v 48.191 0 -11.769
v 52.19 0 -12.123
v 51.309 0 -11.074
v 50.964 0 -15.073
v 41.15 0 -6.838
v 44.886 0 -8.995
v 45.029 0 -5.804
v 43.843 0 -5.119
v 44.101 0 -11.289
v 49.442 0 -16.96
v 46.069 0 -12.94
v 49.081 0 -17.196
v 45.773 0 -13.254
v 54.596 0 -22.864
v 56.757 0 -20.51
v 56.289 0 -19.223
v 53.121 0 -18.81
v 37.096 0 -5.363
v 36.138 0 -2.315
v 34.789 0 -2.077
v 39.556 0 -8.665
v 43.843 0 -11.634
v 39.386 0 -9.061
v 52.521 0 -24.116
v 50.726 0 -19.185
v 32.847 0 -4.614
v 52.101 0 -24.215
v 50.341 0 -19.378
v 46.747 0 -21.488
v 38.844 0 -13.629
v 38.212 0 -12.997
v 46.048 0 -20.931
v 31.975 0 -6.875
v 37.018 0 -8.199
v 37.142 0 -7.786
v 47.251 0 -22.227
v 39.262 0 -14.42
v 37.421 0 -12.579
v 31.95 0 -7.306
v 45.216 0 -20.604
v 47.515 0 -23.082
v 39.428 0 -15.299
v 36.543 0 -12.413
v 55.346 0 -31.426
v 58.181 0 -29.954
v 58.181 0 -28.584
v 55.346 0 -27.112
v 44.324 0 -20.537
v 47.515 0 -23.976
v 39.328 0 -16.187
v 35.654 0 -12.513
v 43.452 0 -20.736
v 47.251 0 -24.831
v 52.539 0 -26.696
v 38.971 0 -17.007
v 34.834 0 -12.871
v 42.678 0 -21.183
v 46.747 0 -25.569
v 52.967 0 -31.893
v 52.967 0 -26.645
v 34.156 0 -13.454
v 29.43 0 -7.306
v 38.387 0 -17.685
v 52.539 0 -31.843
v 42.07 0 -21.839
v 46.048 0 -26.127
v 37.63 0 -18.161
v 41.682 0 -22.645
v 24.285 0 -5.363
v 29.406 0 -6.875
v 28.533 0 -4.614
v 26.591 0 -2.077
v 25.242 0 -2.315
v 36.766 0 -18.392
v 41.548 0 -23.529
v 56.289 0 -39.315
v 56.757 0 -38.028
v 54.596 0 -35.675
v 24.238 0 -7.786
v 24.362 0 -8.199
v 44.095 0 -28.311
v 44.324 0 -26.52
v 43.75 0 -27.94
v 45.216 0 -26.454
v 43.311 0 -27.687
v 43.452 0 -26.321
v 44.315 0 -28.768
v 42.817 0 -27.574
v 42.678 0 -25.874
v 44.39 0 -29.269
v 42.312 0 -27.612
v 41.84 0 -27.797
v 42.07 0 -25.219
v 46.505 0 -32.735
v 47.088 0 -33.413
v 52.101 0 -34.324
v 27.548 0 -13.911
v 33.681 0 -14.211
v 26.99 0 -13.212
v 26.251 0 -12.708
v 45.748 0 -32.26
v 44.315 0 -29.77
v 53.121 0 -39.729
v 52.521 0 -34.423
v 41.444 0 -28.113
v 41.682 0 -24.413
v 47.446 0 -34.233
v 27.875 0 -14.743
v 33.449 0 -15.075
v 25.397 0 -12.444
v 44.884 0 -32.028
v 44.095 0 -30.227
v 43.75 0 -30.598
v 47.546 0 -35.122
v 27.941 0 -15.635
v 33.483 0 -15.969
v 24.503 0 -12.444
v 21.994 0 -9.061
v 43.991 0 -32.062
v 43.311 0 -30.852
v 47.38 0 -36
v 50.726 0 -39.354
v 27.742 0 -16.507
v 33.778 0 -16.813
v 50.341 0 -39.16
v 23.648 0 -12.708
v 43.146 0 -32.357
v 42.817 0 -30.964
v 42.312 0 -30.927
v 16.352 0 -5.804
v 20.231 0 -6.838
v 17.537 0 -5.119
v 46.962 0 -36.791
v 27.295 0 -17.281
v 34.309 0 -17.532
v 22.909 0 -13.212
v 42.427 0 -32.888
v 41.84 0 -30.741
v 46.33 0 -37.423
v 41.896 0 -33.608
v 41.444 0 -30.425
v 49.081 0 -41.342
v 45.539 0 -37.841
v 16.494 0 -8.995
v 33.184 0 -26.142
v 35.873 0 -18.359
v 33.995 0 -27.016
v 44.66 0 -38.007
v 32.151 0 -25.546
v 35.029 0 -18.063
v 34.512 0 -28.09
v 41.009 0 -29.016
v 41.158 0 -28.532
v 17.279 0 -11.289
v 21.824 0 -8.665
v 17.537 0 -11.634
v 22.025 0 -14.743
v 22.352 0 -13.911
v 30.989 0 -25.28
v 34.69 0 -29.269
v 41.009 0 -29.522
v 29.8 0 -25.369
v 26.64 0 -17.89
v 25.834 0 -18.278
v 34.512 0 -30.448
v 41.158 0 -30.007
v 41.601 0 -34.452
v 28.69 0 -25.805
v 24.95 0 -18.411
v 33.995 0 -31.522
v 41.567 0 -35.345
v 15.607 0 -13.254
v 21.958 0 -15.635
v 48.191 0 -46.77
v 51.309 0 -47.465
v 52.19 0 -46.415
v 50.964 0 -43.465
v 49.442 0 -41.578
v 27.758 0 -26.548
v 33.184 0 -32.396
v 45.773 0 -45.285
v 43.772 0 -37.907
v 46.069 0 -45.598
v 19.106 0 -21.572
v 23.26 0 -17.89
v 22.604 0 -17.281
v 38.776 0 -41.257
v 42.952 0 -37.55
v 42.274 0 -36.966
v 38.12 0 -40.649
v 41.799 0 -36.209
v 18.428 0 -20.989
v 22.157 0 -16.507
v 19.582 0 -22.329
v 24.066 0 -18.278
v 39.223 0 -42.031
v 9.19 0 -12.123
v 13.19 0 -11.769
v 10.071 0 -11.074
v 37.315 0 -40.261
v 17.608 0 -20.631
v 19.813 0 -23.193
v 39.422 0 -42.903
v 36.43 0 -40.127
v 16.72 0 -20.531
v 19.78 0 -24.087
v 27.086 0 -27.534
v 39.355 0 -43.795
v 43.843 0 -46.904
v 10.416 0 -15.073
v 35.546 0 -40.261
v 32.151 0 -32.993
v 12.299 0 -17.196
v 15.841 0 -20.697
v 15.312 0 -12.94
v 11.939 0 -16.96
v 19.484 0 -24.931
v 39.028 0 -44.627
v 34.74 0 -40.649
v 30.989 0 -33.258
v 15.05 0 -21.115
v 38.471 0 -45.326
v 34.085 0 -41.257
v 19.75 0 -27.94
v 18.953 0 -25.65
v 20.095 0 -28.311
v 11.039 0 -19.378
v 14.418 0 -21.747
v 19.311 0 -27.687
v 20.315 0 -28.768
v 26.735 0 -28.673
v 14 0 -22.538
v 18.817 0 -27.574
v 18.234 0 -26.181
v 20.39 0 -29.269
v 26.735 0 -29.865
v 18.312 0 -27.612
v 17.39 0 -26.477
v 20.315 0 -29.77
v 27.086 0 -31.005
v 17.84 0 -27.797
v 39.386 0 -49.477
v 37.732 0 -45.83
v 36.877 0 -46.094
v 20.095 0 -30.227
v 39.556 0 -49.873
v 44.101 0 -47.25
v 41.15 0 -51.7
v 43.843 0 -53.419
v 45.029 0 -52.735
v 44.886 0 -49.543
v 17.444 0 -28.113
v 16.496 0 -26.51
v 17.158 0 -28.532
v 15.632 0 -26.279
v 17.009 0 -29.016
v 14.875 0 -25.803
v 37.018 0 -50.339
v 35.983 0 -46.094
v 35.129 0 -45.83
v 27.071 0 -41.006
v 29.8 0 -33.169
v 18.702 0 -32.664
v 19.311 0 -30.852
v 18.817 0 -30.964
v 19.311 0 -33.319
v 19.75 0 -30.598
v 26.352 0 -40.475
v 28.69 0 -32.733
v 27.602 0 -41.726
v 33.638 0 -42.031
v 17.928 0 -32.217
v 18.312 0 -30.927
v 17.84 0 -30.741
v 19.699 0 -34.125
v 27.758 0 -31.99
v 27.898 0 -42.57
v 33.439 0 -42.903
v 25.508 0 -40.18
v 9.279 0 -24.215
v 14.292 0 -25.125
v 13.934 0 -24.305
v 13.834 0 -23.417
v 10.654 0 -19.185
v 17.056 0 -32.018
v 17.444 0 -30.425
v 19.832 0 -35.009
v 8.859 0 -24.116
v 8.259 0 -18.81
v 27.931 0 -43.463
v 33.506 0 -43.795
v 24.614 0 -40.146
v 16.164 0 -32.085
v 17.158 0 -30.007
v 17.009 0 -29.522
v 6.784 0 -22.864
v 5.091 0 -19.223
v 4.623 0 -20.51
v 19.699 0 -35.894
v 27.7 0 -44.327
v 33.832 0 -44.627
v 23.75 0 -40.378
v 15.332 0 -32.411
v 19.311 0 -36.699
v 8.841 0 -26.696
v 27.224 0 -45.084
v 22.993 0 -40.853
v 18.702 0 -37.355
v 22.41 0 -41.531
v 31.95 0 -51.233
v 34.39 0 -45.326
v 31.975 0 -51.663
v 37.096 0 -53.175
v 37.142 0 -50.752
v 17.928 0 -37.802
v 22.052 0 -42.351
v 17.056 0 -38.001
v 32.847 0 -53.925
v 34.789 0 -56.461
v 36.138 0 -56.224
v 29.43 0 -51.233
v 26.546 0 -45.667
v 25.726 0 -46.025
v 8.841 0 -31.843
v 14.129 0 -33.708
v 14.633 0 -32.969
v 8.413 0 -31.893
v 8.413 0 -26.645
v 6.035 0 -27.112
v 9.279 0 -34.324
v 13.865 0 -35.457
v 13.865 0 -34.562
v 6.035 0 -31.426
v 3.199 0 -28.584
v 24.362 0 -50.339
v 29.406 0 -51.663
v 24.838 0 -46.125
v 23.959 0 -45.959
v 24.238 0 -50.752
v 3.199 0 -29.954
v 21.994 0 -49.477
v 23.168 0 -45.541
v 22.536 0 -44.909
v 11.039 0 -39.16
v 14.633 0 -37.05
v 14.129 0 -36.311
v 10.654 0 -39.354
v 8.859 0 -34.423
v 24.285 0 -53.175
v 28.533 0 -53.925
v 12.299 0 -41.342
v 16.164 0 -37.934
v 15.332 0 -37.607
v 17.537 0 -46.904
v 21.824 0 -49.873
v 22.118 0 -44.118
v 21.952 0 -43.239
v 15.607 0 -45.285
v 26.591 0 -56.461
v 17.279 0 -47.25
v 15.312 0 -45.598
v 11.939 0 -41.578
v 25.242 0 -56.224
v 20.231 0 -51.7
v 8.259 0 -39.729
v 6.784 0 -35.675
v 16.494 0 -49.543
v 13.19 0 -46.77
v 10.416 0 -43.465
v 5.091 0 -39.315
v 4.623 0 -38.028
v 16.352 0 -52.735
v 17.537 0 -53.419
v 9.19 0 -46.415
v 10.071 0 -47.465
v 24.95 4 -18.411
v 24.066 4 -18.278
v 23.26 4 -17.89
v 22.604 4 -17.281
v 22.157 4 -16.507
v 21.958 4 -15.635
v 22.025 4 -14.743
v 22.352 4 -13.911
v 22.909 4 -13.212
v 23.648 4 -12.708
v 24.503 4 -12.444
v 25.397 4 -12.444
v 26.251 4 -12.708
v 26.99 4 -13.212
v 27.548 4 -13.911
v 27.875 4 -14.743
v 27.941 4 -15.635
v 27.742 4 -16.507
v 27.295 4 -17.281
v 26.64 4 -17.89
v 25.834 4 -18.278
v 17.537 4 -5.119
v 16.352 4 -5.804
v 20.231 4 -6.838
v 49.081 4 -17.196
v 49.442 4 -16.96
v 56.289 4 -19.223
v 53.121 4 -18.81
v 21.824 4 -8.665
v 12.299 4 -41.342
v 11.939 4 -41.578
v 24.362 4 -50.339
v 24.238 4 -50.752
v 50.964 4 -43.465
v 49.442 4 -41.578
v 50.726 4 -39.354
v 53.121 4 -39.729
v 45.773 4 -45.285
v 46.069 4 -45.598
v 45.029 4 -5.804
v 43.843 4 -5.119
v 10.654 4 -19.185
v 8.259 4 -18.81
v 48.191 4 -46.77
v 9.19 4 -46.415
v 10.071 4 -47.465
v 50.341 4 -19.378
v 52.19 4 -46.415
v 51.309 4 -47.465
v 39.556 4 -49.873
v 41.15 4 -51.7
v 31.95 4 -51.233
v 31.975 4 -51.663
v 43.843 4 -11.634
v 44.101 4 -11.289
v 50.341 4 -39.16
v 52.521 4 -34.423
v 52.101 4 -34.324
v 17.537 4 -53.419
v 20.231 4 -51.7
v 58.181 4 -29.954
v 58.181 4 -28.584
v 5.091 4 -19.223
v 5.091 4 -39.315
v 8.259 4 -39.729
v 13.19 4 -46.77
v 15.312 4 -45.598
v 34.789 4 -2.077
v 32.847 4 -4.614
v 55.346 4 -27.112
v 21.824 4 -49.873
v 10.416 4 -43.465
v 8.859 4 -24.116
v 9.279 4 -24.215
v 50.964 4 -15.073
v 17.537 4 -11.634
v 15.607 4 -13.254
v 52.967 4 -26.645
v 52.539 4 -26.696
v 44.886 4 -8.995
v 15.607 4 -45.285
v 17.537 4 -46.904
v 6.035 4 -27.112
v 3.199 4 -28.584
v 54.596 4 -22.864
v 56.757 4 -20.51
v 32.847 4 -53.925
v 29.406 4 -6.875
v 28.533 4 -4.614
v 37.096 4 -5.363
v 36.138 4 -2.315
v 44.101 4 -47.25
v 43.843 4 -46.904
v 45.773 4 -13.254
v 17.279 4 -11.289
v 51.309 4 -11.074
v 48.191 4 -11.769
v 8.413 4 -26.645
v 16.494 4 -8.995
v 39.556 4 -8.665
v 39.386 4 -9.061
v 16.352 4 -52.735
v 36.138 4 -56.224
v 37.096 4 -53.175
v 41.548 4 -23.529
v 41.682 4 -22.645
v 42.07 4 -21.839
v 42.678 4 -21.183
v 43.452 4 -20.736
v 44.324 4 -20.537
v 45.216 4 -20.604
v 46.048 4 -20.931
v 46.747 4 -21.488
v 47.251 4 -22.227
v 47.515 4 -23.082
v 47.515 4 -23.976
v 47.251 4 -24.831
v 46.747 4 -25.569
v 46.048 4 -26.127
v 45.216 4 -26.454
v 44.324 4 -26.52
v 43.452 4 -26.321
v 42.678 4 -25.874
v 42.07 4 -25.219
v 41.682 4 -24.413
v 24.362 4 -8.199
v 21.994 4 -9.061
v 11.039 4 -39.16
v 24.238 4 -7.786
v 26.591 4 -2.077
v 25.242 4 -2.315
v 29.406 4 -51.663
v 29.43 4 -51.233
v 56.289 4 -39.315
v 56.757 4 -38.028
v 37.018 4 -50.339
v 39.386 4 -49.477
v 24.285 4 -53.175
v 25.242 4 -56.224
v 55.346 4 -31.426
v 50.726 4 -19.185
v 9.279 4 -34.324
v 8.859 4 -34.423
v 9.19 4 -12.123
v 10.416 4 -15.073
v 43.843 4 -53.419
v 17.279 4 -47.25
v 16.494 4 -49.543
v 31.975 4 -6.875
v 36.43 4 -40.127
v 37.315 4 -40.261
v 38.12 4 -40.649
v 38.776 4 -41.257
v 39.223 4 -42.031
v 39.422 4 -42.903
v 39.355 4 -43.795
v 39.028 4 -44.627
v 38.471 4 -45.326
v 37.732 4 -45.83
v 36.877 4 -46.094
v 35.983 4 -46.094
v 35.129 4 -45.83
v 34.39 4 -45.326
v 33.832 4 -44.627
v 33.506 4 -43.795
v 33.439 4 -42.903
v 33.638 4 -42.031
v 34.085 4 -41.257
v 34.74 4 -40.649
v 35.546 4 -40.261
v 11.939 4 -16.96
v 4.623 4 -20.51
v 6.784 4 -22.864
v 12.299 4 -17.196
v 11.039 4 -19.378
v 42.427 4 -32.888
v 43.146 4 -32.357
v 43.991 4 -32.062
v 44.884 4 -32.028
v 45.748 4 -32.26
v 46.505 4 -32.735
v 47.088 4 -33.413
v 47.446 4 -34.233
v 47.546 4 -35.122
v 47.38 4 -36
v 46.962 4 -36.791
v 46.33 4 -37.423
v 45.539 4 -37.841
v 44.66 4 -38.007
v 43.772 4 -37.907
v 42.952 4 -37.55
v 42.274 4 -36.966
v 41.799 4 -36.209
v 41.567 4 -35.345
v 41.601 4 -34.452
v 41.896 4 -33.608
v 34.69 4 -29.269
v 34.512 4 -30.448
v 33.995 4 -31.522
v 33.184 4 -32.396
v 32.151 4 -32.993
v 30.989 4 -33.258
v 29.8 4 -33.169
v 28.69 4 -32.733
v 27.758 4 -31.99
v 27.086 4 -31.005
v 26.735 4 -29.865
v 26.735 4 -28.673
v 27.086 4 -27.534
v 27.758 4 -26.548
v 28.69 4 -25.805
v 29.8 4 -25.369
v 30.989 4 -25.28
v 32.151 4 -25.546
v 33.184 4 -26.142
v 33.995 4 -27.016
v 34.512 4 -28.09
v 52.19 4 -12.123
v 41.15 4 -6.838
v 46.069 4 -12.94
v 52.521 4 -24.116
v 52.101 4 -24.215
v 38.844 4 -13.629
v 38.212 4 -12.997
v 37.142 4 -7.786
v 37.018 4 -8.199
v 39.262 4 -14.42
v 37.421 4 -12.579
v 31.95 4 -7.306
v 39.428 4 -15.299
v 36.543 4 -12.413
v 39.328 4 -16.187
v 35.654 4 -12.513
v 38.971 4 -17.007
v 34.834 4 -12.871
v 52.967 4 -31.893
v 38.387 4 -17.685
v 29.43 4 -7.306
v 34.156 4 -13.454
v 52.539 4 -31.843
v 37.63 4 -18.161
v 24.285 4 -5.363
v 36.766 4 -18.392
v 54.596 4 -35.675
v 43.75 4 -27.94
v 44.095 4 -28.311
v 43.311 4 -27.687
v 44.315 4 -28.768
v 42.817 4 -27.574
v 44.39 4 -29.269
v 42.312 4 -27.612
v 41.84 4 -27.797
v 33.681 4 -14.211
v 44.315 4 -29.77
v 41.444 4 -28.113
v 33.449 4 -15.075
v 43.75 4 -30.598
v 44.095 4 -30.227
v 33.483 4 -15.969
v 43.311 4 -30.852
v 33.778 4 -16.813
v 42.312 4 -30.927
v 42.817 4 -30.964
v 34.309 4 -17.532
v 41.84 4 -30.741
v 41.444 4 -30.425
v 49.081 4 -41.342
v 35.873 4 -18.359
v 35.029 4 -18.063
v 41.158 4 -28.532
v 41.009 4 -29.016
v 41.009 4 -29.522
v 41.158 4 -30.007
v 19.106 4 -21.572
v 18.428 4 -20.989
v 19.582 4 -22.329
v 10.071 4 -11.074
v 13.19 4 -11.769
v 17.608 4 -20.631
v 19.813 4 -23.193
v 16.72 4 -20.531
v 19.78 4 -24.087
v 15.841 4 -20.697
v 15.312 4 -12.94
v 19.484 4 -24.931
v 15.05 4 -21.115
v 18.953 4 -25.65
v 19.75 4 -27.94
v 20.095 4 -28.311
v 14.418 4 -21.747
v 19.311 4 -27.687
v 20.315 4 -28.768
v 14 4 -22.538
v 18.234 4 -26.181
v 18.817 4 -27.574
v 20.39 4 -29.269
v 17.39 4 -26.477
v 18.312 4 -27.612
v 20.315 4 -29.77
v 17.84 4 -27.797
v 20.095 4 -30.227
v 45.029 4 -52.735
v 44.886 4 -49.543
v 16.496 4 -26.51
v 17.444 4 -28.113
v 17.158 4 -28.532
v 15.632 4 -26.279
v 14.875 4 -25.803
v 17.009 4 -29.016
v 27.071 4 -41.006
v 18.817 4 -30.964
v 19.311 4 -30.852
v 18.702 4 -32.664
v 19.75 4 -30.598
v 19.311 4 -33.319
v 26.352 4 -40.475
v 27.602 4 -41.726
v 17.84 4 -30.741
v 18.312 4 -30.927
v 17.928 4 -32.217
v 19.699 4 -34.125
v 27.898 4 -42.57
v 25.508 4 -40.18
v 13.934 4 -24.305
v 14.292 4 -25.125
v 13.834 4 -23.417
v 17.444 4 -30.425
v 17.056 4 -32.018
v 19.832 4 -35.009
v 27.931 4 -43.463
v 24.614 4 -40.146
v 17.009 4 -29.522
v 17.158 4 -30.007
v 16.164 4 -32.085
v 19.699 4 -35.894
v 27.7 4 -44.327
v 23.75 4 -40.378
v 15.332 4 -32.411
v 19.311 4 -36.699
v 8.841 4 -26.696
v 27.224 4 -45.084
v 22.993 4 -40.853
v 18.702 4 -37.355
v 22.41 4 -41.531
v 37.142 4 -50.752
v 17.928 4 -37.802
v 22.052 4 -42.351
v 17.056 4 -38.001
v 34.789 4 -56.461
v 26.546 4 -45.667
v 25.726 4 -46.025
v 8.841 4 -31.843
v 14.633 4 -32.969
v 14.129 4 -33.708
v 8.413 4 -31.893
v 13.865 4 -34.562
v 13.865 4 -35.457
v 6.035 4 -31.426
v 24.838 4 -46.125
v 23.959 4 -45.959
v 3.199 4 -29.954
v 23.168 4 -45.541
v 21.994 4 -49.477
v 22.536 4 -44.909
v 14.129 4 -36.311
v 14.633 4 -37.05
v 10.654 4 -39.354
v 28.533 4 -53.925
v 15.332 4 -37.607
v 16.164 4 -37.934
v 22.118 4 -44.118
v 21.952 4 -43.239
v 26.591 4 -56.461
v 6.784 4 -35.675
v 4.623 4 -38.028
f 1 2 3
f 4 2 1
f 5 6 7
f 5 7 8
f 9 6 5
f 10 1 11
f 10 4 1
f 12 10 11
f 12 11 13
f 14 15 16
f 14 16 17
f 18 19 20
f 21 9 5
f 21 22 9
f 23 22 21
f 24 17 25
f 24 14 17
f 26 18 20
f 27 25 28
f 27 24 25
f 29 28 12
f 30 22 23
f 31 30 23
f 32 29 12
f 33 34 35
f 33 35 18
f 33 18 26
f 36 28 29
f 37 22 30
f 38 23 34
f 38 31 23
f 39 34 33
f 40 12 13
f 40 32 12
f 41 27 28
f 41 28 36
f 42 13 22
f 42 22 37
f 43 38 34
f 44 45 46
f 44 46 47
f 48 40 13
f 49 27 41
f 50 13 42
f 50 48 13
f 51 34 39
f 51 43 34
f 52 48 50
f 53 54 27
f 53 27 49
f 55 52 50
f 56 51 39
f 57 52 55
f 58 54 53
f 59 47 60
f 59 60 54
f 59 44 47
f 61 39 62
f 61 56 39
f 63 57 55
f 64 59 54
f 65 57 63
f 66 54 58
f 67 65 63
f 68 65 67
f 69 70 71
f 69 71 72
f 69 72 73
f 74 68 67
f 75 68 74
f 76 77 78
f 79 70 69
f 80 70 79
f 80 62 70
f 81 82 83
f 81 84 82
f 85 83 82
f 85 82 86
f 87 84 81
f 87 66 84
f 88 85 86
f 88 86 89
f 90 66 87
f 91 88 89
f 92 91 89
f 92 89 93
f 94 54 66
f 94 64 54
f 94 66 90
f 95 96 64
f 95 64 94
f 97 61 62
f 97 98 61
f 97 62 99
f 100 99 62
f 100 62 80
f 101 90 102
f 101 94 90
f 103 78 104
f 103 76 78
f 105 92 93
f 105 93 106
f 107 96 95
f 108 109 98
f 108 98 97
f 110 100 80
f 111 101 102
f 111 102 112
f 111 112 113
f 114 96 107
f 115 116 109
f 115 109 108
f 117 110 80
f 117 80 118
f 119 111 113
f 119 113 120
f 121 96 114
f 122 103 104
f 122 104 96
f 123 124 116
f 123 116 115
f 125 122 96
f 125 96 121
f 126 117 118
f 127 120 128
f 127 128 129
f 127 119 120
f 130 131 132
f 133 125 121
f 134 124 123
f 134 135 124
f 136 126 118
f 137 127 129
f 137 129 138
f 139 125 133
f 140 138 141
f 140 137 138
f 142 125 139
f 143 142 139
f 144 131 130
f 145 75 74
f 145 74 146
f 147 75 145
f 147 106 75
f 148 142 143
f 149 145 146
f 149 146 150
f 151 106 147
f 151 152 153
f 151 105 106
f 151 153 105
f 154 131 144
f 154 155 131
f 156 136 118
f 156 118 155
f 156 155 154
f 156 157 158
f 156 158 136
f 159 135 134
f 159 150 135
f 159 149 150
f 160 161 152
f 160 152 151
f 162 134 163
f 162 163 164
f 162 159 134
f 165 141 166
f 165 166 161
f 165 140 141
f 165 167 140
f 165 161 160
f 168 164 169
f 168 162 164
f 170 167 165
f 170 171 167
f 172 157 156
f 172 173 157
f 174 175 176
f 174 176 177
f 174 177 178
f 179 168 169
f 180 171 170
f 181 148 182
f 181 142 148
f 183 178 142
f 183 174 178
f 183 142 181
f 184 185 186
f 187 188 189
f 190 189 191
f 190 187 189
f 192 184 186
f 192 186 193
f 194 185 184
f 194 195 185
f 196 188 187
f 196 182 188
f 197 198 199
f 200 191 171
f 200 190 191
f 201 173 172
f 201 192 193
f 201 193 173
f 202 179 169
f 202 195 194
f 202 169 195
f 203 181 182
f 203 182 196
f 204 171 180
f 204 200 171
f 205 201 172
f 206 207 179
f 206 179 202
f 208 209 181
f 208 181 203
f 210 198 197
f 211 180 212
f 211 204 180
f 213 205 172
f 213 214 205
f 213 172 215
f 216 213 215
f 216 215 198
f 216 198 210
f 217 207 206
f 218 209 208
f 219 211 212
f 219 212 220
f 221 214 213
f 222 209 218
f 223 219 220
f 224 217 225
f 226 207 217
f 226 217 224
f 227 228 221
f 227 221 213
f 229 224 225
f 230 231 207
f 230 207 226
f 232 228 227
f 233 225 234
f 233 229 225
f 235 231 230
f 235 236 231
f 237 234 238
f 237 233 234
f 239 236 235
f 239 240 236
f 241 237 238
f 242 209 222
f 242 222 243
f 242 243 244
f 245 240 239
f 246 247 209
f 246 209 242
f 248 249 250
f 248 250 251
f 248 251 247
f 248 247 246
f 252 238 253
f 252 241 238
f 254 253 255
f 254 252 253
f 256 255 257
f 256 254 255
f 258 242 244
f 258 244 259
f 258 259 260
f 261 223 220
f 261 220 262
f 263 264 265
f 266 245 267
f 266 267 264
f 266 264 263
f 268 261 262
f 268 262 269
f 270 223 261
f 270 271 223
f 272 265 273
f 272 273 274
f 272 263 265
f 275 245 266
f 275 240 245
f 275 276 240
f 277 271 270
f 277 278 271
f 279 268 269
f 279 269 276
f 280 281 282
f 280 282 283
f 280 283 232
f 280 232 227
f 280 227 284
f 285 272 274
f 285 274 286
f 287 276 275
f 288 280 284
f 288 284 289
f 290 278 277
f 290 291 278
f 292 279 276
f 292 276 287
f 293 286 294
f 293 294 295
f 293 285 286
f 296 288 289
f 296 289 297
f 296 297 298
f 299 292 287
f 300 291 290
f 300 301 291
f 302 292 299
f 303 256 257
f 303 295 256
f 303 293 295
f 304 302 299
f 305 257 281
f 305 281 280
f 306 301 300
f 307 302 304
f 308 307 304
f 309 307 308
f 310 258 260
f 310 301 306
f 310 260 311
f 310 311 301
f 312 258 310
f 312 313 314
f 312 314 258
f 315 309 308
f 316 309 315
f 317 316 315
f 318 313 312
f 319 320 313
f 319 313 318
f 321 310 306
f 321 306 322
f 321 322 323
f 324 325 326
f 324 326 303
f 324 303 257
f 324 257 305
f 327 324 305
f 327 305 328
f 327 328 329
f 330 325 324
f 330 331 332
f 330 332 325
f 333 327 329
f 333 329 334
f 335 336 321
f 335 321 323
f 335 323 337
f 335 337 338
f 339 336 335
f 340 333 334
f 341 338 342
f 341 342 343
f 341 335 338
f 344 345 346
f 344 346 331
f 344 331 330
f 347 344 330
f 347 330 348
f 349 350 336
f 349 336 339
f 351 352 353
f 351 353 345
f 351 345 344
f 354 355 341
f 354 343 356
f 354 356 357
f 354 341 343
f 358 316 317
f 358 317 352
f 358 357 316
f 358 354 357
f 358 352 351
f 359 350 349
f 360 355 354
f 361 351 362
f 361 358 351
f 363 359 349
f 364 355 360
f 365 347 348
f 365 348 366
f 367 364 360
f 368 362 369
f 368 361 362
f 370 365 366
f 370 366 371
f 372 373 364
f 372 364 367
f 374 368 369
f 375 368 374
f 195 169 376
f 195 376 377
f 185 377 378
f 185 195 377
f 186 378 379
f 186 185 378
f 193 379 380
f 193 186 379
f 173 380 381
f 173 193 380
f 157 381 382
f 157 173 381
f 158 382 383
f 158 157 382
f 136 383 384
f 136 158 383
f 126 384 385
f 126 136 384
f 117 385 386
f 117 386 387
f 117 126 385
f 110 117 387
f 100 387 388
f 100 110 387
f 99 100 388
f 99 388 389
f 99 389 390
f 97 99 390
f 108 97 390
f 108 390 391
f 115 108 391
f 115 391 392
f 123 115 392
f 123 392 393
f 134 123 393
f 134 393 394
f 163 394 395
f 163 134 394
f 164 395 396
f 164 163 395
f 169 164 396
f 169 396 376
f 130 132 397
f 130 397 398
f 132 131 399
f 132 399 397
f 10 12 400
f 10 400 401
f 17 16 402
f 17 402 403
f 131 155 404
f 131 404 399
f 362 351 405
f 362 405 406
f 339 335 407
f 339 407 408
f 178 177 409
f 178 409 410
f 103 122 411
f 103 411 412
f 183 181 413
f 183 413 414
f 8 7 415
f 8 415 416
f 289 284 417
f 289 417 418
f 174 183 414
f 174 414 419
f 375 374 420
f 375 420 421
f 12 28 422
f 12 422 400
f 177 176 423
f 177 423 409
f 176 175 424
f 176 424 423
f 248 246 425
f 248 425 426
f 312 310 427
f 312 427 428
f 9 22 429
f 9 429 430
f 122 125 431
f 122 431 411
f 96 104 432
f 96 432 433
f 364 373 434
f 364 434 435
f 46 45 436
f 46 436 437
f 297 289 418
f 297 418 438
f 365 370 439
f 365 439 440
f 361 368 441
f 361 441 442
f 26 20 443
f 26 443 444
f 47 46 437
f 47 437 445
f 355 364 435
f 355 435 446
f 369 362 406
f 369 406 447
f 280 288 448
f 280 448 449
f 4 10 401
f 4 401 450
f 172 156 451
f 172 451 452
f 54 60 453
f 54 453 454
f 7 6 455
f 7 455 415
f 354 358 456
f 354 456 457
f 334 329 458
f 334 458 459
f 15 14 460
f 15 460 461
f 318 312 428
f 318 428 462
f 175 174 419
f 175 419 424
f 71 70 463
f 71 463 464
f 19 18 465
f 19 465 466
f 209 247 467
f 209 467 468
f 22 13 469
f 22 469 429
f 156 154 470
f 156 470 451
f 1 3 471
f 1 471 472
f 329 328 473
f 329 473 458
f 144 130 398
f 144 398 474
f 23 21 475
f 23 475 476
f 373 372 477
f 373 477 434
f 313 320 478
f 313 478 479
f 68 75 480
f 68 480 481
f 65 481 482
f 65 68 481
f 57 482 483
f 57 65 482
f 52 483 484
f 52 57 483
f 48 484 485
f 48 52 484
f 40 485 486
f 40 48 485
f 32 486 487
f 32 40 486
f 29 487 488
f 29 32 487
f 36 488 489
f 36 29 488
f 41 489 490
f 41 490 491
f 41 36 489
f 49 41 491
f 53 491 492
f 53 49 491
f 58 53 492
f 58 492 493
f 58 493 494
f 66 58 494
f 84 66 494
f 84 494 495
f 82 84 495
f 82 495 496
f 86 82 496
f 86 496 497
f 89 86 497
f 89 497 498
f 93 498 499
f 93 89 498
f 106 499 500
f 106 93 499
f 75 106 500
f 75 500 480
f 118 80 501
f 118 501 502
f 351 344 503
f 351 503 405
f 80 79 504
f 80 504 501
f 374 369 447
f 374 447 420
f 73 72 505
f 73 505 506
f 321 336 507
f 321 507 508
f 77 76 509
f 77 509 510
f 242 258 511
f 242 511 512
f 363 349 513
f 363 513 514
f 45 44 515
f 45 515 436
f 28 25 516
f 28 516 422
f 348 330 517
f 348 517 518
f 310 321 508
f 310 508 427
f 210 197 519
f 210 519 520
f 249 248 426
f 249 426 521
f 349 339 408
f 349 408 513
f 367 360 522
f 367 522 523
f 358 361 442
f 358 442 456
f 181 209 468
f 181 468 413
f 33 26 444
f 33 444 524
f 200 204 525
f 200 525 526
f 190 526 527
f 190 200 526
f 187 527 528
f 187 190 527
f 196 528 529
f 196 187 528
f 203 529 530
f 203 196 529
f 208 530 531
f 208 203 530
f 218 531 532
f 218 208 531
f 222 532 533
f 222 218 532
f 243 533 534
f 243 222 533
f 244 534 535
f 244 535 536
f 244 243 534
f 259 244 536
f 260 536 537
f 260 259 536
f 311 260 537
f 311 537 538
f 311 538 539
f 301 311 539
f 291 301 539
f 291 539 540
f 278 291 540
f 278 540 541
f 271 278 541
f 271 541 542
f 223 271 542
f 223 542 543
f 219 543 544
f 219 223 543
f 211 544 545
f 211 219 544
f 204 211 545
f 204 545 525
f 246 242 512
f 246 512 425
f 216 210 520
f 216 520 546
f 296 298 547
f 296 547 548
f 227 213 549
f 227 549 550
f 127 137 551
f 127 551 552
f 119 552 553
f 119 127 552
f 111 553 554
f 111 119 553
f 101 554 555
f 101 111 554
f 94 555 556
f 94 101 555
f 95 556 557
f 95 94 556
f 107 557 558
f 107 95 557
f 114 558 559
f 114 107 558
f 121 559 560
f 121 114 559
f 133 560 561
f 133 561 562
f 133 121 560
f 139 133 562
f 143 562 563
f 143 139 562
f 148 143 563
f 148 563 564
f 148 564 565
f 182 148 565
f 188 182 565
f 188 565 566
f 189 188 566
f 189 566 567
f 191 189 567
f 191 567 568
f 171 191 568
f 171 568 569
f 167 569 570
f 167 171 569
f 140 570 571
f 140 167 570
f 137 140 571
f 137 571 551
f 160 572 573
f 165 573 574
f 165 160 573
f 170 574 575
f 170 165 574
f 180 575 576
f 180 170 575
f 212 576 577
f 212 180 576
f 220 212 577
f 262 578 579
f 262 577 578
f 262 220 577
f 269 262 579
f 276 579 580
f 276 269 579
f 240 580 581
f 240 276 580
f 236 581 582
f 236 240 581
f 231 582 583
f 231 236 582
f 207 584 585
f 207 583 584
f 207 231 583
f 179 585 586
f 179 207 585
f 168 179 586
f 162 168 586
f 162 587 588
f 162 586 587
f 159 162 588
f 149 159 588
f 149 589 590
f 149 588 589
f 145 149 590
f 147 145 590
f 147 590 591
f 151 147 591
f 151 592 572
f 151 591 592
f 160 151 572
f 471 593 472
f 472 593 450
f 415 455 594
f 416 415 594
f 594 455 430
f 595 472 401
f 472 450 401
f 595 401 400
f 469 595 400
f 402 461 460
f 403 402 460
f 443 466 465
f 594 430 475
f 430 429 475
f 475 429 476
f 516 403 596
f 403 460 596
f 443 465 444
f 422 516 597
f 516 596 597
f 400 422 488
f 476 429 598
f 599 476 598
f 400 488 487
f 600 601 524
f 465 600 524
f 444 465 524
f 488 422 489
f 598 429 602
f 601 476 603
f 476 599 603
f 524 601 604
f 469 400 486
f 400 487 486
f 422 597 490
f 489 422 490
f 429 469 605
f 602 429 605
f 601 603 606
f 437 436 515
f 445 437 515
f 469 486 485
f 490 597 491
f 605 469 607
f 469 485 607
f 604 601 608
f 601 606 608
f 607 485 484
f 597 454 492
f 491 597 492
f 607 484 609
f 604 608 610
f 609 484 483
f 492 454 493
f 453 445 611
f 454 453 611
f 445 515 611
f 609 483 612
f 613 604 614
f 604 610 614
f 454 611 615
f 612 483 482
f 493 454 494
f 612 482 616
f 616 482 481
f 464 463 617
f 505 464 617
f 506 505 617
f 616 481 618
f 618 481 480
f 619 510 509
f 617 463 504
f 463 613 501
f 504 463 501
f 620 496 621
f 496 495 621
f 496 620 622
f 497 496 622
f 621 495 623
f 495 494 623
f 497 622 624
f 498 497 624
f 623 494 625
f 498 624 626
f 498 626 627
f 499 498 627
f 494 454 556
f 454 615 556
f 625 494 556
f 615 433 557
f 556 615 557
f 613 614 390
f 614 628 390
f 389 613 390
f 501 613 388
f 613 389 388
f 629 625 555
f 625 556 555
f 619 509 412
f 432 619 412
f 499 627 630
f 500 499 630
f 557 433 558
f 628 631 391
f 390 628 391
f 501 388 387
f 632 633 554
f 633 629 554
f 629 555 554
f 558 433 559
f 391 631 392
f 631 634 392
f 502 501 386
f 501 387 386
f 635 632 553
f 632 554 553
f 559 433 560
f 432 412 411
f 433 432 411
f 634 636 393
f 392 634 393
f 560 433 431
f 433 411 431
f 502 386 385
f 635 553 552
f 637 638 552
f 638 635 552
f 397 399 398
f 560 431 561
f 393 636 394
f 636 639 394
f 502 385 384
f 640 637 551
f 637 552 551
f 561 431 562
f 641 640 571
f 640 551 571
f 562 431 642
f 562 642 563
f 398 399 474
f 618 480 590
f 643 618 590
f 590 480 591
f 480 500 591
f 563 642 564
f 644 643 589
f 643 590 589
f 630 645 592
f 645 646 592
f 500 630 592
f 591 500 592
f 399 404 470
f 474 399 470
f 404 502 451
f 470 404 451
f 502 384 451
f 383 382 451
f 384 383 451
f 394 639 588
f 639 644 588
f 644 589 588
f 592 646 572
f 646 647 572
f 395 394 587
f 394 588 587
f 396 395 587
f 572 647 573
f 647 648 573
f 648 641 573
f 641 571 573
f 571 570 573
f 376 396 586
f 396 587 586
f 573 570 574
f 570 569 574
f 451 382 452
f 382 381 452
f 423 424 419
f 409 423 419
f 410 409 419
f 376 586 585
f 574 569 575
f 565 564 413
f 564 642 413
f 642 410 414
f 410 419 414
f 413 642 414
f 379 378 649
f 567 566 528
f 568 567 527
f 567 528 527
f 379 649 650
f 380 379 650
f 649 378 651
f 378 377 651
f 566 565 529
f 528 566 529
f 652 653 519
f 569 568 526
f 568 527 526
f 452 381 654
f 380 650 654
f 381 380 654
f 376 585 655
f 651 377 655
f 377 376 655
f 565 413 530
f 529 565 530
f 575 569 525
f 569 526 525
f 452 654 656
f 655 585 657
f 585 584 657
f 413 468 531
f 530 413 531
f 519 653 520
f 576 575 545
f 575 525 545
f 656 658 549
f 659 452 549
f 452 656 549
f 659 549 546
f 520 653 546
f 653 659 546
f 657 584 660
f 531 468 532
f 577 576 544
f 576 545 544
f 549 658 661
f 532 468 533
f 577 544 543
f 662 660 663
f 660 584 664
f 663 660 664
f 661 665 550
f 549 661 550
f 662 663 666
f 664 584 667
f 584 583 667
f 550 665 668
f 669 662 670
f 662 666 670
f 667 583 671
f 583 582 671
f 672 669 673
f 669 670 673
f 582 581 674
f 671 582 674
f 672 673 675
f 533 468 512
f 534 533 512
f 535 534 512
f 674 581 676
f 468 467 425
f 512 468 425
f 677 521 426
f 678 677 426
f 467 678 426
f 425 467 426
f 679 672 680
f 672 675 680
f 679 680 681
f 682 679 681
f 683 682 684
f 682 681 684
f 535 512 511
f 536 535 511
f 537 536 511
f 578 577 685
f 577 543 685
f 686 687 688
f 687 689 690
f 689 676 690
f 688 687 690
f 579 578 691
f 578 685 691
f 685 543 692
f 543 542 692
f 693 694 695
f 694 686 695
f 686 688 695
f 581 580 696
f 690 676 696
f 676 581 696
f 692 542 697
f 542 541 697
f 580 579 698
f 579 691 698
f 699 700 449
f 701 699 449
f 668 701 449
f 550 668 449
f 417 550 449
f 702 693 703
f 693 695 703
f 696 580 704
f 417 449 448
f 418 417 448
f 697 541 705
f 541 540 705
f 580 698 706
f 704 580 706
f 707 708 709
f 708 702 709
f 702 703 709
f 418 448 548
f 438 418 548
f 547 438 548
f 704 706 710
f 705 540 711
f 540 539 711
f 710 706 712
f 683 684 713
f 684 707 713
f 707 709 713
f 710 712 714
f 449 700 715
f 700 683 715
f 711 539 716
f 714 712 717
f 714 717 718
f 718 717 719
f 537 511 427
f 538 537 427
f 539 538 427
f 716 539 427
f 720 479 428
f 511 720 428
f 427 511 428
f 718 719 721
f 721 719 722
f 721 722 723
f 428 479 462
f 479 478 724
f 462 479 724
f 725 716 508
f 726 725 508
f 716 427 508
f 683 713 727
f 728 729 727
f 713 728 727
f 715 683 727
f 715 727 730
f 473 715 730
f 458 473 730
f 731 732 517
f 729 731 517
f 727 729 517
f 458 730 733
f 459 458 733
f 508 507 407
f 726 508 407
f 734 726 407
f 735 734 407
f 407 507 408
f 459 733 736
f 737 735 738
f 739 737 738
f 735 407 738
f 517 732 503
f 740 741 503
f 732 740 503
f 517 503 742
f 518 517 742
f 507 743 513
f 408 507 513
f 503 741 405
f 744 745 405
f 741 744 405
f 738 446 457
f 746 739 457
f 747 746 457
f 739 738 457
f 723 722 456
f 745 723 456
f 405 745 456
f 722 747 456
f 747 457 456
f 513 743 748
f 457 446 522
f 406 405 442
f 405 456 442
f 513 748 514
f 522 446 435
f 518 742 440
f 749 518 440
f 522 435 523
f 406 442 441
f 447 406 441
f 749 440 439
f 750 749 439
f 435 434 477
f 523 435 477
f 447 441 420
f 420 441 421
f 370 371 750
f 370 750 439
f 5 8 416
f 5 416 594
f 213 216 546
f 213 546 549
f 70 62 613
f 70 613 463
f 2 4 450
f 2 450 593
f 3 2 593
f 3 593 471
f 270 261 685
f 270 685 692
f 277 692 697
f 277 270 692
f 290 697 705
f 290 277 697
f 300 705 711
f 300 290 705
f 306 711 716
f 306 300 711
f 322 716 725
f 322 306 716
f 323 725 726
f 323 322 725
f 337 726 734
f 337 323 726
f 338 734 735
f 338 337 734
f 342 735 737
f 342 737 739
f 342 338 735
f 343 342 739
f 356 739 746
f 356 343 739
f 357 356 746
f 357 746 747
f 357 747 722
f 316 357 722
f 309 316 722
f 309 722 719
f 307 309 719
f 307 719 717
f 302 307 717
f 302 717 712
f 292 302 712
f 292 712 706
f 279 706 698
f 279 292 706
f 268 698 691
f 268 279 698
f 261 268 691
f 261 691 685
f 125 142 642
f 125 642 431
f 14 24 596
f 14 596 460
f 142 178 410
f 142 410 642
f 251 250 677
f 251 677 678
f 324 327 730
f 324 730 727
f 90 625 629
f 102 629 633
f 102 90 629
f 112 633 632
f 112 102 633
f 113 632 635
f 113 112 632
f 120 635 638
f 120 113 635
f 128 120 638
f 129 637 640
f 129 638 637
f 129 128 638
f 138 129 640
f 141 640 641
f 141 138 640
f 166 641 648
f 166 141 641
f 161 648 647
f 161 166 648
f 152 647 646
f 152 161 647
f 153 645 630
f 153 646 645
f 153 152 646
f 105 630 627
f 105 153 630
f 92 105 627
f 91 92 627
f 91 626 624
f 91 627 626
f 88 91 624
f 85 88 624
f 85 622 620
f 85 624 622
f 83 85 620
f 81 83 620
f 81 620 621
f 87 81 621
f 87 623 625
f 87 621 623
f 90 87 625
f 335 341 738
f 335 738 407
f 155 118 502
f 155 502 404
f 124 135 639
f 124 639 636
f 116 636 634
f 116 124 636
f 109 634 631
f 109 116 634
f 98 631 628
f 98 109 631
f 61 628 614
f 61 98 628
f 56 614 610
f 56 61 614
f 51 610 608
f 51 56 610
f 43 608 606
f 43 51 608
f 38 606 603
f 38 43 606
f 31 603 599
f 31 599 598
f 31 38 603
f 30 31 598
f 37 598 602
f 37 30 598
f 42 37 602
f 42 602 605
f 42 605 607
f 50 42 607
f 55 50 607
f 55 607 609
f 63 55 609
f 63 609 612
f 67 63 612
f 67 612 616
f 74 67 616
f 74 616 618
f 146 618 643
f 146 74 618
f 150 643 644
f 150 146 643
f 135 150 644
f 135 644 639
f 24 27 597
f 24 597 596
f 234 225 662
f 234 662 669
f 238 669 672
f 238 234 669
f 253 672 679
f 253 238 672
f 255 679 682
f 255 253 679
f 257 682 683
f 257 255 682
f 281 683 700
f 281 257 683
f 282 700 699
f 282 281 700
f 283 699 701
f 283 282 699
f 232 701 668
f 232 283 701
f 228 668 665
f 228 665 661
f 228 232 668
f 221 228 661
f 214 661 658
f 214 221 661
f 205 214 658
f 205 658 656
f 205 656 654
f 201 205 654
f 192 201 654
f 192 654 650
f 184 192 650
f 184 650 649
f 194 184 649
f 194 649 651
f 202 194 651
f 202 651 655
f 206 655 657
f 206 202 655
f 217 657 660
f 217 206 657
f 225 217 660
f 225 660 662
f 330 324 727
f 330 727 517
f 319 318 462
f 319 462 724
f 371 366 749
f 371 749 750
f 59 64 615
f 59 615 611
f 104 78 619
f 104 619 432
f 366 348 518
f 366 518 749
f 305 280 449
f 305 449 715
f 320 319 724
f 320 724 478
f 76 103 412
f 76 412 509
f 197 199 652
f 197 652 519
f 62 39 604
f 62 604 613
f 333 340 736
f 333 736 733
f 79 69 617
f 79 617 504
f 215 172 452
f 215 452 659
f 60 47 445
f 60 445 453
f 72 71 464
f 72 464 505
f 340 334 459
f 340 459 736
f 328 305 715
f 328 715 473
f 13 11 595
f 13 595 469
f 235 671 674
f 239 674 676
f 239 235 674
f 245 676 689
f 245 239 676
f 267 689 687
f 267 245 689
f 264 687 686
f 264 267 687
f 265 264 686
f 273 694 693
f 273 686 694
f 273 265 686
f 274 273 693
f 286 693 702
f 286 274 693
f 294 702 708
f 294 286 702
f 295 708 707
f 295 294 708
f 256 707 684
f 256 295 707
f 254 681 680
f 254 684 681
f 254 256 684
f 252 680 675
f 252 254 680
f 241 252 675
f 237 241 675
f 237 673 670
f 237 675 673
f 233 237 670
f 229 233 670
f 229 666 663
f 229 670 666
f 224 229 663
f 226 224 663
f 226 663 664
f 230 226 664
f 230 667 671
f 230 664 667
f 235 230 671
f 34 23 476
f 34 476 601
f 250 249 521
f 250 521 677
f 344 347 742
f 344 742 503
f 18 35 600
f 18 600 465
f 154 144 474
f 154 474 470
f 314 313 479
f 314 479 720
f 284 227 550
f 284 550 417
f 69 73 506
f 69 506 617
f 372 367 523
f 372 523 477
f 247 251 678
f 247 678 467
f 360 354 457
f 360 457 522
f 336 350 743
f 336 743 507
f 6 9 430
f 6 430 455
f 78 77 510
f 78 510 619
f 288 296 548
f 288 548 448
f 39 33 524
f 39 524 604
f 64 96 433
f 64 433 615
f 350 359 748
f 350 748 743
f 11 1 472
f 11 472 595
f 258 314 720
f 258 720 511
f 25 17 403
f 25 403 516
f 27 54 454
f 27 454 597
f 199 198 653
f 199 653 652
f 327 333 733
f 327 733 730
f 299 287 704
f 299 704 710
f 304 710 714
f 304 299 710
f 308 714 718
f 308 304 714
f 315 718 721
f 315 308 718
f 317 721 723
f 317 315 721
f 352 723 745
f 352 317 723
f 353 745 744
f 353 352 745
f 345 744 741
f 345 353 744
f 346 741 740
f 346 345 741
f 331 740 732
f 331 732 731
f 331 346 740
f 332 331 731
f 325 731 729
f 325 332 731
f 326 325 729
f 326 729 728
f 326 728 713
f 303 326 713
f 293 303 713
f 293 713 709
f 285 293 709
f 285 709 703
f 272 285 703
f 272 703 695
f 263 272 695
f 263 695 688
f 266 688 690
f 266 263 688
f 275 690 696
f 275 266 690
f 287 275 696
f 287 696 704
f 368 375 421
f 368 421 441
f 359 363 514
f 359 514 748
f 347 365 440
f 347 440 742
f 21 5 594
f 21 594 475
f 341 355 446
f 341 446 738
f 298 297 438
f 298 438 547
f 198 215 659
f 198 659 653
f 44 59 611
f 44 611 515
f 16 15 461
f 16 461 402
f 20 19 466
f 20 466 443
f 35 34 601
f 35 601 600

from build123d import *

# Parameters (mm, degrees)
BOSS_EXTRUDE1_DEPTH = 4
CUT_EXTRUDE1_REACH  = 6
SKETCH3_R           = 4
SKETCH3_R_2         = 1.7
SKETCH4_R           = 3
CUT_EXTRUDE2_DEPTH  = 4
CIRPATTERN1_COUNT   = 8


with BuildPart() as part:
    # Sketch2 → Boss-Extrude1 (new body)
    with BuildSketch(Plane(origin=(0, 0, 0), x_dir=(1, 0, 0), z_dir=(0, 1, 0))):
        Polygon((52.538734218, 31.842538875), (52.966809318, 31.892862657), (55.345625477, 31.426126758), (58.18102676, 29.953783051), (58.18102676, 28.584463126), (55.345625477, 27.112119419), (52.966809318, 26.64538352), (52.538734218, 26.695707302), (52.101156541, 24.214732135), (52.520808121, 24.115596779), (54.59638672, 22.863553353), (56.757494627, 20.510006991), (56.289031474, 19.223191192), (53.12080355, 18.809586915), (50.72600436, 19.184530393), (50.340910107, 19.378265245), (49.081307935, 17.196423401), (49.441564779, 16.959924277), (50.963799881, 15.07332886), (52.189708735, 12.122809954), (51.309369324, 11.073573865), (48.190601939, 11.768601179), (46.068586453, 12.939866968), (45.772908404, 13.25368769), (43.842900517, 11.634261062), (44.100782542, 11.288690853), (44.885873492, 8.995402472), (45.028637129, 5.803632771), (43.842684706, 5.118756998), (41.149615437, 6.838398802), (39.556106805, 8.664951285), (39.385697153, 9.061061087), (37.018327401, 8.199295971), (37.142300931, 7.786339893), (37.095648999, 5.362815632), (36.138204566, 2.314673579), (34.789402002, 2.076878058), (32.847083699, 4.613576876), (31.97451961, 6.875115771), (31.949681435, 7.305566323), (29.430477092, 7.305566323), (29.405639683, 6.875115771), (28.533075594, 4.613576876), (26.590757291, 2.076878058), (25.241954726, 2.314673579), (24.284510294, 5.362815632), (24.237858361, 7.786339893), (24.361831127, 8.199295971), (21.994461374, 9.061061087), (21.824052488, 8.664951285), (20.230543856, 6.838398802), (17.537474587, 5.118756998), (16.351521398, 5.803632771), (16.494285035, 8.995402472), (17.279376751, 11.288690853), (17.537258011, 11.634261062), (15.607250889, 13.25368769), (15.311572074, 12.939866968), (13.189557354, 11.768601179), (10.070789203, 11.073573865), (9.190449792, 12.122809954), (10.416359412, 15.07332886), (11.938594514, 16.959924277), (12.298851357, 17.196423401), (11.039249186, 19.378265245), (10.654154168, 19.184530393), (8.259354977, 18.809586915), (5.091127819, 19.223191192), (4.622664666, 20.510006991), (6.783771808, 22.863553353), (8.859351172, 24.115596779), (9.279002752, 24.214732135), (8.84142431, 26.695707302), (8.413349975, 26.64538352), (6.034533051, 27.112119419), (3.199132533, 28.584463126), (3.199132533, 29.953783051), (6.034533051, 31.426126758), (8.413349975, 31.892862657), (8.84142431, 31.842538875), (9.279002752, 34.323514042), (8.859351172, 34.422649398), (6.783771808, 35.674692824), (4.622664666, 38.028239186), (5.091127819, 39.315054985), (8.259354977, 39.728659262), (10.654154168, 39.353715784), (11.039249186, 39.159980932), (12.298851357, 41.341822776), (11.938594514, 41.5783219), (10.416359412, 43.464917317), (9.190449792, 46.415436223), (10.070789203, 47.464672312), (13.189557354, 46.769644998), (15.311572074, 45.598379209), (15.607250889, 45.284558487), (17.537258011, 46.903985115), (17.279376751, 47.249555324), (16.494285035, 49.542843705), (16.351521398, 52.734613406), (17.537474587, 53.41948918), (20.230543856, 51.699847375), (21.824052488, 49.873294892), (21.994461374, 49.47718509), (24.361831127, 50.338950206), (24.237858361, 50.751906284), (24.284510294, 53.175430545), (25.241954726, 56.223572598), (26.590757291, 56.46136812), (28.533075594, 53.924669301), (29.405639683, 51.663130406), (29.430477092, 51.232679854), (31.949681435, 51.232679854), (31.97451961, 51.663130406), (32.847083699, 53.924669301), (34.789402002, 56.46136812), (36.138204566, 56.223572598), (37.095648999, 53.175430545), (37.142300931, 50.751906284), (37.018327401, 50.338950206), (39.385697153, 49.47718509), (39.556106805, 49.873294892), (41.149615437, 51.699847375), (43.842684706, 53.41948918), (45.028637129, 52.734613406), (44.885873492, 49.542843705), (44.100782542, 47.249555324), (43.842900517, 46.903985115), (45.772908404, 45.284558487), (46.068586453, 45.598379209), (48.190601939, 46.769644998), (51.309369324, 47.464672312), (52.189708735, 46.415436223), (50.963799881, 43.464917317), (49.441564779, 41.5783219), (49.081307935, 41.341822776), (50.340910107, 39.159980932), (50.72600436, 39.353715784), (53.12080355, 39.728659262), (56.289031474, 39.315054985), (56.757494627, 38.028239186), (54.59638672, 35.674692824), (52.520808121, 34.422649398), (52.101156541, 34.323514042), align=None)
    extrude(amount=BOSS_EXTRUDE1_DEPTH)

    # Sketch3 → Cut-Extrude1 (cut, up to next)
    with BuildSketch(Plane(origin=(0, 0, 0), x_dir=(1, 0, 0), z_dir=(0, 1, 0)), mode=Mode.PRIVATE) as cut_extrude1_sk1:
        with Locations((30.690079264, 29.269123089)):
            Circle(SKETCH3_R)
    cut_extrude1_tool1 = extrude(cut_extrude1_sk1.sketch, amount=CUT_EXTRUDE1_REACH, mode=Mode.PRIVATE) & part.part
    add(cut_extrude1_tool1.solids().sort_by_distance((30.690079, 0, -29.269123))[0], mode=Mode.SUBTRACT)
    # Sketch3 → Cut-Extrude1 (cut, up to next)
    with BuildSketch(Plane(origin=(0, 0, 0), x_dir=(1, 0, 0), z_dir=(0, 1, 0)), mode=Mode.PRIVATE) as cut_extrude1_sk2:
        with Locations((18.690079264, 29.269123089)):
            Circle(SKETCH3_R_2)
    cut_extrude1_tool2 = extrude(cut_extrude1_sk2.sketch, amount=CUT_EXTRUDE1_REACH, mode=Mode.PRIVATE) & part.part
    add(cut_extrude1_tool2.solids().sort_by_distance((18.690079, 0, -29.269123))[0], mode=Mode.SUBTRACT)
    # Sketch3 → Cut-Extrude1 (cut, up to next)
    with BuildSketch(Plane(origin=(0, 0, 0), x_dir=(1, 0, 0), z_dir=(0, 1, 0)), mode=Mode.PRIVATE) as cut_extrude1_sk3:
        with Locations((42.690079264, 29.269123089)):
            Circle(SKETCH3_R_2)
    cut_extrude1_tool3 = extrude(cut_extrude1_sk3.sketch, amount=CUT_EXTRUDE1_REACH, mode=Mode.PRIVATE) & part.part
    add(cut_extrude1_tool3.solids().sort_by_distance((42.690079, 0, -29.269123))[0], mode=Mode.SUBTRACT)

    # Sketch4 → Cut-Extrude2 (cut)
    with BuildSketch(Plane(origin=(0, 0, 0), x_dir=(1, 0, 0), z_dir=(0, 1, 0))):
        with Locations((16.831886276, 35.009374574)):
            Circle(SKETCH4_R)
    cut_extrude2 = extrude(amount=CUT_EXTRUDE2_DEPTH, mode=Mode.SUBTRACT)

    # CirPattern1: Cut-Extrude2 ×8 about axis
    cirpattern1_axis = Axis((30.690079264, 0, -29.269123089), (0, 1, 0))
    for i in range(1, CIRPATTERN1_COUNT):
        add(cut_extrude2.rotate(cirpattern1_axis, i * 360 / CIRPATTERN1_COUNT), mode=Mode.SUBTRACT)


solid = part.part
